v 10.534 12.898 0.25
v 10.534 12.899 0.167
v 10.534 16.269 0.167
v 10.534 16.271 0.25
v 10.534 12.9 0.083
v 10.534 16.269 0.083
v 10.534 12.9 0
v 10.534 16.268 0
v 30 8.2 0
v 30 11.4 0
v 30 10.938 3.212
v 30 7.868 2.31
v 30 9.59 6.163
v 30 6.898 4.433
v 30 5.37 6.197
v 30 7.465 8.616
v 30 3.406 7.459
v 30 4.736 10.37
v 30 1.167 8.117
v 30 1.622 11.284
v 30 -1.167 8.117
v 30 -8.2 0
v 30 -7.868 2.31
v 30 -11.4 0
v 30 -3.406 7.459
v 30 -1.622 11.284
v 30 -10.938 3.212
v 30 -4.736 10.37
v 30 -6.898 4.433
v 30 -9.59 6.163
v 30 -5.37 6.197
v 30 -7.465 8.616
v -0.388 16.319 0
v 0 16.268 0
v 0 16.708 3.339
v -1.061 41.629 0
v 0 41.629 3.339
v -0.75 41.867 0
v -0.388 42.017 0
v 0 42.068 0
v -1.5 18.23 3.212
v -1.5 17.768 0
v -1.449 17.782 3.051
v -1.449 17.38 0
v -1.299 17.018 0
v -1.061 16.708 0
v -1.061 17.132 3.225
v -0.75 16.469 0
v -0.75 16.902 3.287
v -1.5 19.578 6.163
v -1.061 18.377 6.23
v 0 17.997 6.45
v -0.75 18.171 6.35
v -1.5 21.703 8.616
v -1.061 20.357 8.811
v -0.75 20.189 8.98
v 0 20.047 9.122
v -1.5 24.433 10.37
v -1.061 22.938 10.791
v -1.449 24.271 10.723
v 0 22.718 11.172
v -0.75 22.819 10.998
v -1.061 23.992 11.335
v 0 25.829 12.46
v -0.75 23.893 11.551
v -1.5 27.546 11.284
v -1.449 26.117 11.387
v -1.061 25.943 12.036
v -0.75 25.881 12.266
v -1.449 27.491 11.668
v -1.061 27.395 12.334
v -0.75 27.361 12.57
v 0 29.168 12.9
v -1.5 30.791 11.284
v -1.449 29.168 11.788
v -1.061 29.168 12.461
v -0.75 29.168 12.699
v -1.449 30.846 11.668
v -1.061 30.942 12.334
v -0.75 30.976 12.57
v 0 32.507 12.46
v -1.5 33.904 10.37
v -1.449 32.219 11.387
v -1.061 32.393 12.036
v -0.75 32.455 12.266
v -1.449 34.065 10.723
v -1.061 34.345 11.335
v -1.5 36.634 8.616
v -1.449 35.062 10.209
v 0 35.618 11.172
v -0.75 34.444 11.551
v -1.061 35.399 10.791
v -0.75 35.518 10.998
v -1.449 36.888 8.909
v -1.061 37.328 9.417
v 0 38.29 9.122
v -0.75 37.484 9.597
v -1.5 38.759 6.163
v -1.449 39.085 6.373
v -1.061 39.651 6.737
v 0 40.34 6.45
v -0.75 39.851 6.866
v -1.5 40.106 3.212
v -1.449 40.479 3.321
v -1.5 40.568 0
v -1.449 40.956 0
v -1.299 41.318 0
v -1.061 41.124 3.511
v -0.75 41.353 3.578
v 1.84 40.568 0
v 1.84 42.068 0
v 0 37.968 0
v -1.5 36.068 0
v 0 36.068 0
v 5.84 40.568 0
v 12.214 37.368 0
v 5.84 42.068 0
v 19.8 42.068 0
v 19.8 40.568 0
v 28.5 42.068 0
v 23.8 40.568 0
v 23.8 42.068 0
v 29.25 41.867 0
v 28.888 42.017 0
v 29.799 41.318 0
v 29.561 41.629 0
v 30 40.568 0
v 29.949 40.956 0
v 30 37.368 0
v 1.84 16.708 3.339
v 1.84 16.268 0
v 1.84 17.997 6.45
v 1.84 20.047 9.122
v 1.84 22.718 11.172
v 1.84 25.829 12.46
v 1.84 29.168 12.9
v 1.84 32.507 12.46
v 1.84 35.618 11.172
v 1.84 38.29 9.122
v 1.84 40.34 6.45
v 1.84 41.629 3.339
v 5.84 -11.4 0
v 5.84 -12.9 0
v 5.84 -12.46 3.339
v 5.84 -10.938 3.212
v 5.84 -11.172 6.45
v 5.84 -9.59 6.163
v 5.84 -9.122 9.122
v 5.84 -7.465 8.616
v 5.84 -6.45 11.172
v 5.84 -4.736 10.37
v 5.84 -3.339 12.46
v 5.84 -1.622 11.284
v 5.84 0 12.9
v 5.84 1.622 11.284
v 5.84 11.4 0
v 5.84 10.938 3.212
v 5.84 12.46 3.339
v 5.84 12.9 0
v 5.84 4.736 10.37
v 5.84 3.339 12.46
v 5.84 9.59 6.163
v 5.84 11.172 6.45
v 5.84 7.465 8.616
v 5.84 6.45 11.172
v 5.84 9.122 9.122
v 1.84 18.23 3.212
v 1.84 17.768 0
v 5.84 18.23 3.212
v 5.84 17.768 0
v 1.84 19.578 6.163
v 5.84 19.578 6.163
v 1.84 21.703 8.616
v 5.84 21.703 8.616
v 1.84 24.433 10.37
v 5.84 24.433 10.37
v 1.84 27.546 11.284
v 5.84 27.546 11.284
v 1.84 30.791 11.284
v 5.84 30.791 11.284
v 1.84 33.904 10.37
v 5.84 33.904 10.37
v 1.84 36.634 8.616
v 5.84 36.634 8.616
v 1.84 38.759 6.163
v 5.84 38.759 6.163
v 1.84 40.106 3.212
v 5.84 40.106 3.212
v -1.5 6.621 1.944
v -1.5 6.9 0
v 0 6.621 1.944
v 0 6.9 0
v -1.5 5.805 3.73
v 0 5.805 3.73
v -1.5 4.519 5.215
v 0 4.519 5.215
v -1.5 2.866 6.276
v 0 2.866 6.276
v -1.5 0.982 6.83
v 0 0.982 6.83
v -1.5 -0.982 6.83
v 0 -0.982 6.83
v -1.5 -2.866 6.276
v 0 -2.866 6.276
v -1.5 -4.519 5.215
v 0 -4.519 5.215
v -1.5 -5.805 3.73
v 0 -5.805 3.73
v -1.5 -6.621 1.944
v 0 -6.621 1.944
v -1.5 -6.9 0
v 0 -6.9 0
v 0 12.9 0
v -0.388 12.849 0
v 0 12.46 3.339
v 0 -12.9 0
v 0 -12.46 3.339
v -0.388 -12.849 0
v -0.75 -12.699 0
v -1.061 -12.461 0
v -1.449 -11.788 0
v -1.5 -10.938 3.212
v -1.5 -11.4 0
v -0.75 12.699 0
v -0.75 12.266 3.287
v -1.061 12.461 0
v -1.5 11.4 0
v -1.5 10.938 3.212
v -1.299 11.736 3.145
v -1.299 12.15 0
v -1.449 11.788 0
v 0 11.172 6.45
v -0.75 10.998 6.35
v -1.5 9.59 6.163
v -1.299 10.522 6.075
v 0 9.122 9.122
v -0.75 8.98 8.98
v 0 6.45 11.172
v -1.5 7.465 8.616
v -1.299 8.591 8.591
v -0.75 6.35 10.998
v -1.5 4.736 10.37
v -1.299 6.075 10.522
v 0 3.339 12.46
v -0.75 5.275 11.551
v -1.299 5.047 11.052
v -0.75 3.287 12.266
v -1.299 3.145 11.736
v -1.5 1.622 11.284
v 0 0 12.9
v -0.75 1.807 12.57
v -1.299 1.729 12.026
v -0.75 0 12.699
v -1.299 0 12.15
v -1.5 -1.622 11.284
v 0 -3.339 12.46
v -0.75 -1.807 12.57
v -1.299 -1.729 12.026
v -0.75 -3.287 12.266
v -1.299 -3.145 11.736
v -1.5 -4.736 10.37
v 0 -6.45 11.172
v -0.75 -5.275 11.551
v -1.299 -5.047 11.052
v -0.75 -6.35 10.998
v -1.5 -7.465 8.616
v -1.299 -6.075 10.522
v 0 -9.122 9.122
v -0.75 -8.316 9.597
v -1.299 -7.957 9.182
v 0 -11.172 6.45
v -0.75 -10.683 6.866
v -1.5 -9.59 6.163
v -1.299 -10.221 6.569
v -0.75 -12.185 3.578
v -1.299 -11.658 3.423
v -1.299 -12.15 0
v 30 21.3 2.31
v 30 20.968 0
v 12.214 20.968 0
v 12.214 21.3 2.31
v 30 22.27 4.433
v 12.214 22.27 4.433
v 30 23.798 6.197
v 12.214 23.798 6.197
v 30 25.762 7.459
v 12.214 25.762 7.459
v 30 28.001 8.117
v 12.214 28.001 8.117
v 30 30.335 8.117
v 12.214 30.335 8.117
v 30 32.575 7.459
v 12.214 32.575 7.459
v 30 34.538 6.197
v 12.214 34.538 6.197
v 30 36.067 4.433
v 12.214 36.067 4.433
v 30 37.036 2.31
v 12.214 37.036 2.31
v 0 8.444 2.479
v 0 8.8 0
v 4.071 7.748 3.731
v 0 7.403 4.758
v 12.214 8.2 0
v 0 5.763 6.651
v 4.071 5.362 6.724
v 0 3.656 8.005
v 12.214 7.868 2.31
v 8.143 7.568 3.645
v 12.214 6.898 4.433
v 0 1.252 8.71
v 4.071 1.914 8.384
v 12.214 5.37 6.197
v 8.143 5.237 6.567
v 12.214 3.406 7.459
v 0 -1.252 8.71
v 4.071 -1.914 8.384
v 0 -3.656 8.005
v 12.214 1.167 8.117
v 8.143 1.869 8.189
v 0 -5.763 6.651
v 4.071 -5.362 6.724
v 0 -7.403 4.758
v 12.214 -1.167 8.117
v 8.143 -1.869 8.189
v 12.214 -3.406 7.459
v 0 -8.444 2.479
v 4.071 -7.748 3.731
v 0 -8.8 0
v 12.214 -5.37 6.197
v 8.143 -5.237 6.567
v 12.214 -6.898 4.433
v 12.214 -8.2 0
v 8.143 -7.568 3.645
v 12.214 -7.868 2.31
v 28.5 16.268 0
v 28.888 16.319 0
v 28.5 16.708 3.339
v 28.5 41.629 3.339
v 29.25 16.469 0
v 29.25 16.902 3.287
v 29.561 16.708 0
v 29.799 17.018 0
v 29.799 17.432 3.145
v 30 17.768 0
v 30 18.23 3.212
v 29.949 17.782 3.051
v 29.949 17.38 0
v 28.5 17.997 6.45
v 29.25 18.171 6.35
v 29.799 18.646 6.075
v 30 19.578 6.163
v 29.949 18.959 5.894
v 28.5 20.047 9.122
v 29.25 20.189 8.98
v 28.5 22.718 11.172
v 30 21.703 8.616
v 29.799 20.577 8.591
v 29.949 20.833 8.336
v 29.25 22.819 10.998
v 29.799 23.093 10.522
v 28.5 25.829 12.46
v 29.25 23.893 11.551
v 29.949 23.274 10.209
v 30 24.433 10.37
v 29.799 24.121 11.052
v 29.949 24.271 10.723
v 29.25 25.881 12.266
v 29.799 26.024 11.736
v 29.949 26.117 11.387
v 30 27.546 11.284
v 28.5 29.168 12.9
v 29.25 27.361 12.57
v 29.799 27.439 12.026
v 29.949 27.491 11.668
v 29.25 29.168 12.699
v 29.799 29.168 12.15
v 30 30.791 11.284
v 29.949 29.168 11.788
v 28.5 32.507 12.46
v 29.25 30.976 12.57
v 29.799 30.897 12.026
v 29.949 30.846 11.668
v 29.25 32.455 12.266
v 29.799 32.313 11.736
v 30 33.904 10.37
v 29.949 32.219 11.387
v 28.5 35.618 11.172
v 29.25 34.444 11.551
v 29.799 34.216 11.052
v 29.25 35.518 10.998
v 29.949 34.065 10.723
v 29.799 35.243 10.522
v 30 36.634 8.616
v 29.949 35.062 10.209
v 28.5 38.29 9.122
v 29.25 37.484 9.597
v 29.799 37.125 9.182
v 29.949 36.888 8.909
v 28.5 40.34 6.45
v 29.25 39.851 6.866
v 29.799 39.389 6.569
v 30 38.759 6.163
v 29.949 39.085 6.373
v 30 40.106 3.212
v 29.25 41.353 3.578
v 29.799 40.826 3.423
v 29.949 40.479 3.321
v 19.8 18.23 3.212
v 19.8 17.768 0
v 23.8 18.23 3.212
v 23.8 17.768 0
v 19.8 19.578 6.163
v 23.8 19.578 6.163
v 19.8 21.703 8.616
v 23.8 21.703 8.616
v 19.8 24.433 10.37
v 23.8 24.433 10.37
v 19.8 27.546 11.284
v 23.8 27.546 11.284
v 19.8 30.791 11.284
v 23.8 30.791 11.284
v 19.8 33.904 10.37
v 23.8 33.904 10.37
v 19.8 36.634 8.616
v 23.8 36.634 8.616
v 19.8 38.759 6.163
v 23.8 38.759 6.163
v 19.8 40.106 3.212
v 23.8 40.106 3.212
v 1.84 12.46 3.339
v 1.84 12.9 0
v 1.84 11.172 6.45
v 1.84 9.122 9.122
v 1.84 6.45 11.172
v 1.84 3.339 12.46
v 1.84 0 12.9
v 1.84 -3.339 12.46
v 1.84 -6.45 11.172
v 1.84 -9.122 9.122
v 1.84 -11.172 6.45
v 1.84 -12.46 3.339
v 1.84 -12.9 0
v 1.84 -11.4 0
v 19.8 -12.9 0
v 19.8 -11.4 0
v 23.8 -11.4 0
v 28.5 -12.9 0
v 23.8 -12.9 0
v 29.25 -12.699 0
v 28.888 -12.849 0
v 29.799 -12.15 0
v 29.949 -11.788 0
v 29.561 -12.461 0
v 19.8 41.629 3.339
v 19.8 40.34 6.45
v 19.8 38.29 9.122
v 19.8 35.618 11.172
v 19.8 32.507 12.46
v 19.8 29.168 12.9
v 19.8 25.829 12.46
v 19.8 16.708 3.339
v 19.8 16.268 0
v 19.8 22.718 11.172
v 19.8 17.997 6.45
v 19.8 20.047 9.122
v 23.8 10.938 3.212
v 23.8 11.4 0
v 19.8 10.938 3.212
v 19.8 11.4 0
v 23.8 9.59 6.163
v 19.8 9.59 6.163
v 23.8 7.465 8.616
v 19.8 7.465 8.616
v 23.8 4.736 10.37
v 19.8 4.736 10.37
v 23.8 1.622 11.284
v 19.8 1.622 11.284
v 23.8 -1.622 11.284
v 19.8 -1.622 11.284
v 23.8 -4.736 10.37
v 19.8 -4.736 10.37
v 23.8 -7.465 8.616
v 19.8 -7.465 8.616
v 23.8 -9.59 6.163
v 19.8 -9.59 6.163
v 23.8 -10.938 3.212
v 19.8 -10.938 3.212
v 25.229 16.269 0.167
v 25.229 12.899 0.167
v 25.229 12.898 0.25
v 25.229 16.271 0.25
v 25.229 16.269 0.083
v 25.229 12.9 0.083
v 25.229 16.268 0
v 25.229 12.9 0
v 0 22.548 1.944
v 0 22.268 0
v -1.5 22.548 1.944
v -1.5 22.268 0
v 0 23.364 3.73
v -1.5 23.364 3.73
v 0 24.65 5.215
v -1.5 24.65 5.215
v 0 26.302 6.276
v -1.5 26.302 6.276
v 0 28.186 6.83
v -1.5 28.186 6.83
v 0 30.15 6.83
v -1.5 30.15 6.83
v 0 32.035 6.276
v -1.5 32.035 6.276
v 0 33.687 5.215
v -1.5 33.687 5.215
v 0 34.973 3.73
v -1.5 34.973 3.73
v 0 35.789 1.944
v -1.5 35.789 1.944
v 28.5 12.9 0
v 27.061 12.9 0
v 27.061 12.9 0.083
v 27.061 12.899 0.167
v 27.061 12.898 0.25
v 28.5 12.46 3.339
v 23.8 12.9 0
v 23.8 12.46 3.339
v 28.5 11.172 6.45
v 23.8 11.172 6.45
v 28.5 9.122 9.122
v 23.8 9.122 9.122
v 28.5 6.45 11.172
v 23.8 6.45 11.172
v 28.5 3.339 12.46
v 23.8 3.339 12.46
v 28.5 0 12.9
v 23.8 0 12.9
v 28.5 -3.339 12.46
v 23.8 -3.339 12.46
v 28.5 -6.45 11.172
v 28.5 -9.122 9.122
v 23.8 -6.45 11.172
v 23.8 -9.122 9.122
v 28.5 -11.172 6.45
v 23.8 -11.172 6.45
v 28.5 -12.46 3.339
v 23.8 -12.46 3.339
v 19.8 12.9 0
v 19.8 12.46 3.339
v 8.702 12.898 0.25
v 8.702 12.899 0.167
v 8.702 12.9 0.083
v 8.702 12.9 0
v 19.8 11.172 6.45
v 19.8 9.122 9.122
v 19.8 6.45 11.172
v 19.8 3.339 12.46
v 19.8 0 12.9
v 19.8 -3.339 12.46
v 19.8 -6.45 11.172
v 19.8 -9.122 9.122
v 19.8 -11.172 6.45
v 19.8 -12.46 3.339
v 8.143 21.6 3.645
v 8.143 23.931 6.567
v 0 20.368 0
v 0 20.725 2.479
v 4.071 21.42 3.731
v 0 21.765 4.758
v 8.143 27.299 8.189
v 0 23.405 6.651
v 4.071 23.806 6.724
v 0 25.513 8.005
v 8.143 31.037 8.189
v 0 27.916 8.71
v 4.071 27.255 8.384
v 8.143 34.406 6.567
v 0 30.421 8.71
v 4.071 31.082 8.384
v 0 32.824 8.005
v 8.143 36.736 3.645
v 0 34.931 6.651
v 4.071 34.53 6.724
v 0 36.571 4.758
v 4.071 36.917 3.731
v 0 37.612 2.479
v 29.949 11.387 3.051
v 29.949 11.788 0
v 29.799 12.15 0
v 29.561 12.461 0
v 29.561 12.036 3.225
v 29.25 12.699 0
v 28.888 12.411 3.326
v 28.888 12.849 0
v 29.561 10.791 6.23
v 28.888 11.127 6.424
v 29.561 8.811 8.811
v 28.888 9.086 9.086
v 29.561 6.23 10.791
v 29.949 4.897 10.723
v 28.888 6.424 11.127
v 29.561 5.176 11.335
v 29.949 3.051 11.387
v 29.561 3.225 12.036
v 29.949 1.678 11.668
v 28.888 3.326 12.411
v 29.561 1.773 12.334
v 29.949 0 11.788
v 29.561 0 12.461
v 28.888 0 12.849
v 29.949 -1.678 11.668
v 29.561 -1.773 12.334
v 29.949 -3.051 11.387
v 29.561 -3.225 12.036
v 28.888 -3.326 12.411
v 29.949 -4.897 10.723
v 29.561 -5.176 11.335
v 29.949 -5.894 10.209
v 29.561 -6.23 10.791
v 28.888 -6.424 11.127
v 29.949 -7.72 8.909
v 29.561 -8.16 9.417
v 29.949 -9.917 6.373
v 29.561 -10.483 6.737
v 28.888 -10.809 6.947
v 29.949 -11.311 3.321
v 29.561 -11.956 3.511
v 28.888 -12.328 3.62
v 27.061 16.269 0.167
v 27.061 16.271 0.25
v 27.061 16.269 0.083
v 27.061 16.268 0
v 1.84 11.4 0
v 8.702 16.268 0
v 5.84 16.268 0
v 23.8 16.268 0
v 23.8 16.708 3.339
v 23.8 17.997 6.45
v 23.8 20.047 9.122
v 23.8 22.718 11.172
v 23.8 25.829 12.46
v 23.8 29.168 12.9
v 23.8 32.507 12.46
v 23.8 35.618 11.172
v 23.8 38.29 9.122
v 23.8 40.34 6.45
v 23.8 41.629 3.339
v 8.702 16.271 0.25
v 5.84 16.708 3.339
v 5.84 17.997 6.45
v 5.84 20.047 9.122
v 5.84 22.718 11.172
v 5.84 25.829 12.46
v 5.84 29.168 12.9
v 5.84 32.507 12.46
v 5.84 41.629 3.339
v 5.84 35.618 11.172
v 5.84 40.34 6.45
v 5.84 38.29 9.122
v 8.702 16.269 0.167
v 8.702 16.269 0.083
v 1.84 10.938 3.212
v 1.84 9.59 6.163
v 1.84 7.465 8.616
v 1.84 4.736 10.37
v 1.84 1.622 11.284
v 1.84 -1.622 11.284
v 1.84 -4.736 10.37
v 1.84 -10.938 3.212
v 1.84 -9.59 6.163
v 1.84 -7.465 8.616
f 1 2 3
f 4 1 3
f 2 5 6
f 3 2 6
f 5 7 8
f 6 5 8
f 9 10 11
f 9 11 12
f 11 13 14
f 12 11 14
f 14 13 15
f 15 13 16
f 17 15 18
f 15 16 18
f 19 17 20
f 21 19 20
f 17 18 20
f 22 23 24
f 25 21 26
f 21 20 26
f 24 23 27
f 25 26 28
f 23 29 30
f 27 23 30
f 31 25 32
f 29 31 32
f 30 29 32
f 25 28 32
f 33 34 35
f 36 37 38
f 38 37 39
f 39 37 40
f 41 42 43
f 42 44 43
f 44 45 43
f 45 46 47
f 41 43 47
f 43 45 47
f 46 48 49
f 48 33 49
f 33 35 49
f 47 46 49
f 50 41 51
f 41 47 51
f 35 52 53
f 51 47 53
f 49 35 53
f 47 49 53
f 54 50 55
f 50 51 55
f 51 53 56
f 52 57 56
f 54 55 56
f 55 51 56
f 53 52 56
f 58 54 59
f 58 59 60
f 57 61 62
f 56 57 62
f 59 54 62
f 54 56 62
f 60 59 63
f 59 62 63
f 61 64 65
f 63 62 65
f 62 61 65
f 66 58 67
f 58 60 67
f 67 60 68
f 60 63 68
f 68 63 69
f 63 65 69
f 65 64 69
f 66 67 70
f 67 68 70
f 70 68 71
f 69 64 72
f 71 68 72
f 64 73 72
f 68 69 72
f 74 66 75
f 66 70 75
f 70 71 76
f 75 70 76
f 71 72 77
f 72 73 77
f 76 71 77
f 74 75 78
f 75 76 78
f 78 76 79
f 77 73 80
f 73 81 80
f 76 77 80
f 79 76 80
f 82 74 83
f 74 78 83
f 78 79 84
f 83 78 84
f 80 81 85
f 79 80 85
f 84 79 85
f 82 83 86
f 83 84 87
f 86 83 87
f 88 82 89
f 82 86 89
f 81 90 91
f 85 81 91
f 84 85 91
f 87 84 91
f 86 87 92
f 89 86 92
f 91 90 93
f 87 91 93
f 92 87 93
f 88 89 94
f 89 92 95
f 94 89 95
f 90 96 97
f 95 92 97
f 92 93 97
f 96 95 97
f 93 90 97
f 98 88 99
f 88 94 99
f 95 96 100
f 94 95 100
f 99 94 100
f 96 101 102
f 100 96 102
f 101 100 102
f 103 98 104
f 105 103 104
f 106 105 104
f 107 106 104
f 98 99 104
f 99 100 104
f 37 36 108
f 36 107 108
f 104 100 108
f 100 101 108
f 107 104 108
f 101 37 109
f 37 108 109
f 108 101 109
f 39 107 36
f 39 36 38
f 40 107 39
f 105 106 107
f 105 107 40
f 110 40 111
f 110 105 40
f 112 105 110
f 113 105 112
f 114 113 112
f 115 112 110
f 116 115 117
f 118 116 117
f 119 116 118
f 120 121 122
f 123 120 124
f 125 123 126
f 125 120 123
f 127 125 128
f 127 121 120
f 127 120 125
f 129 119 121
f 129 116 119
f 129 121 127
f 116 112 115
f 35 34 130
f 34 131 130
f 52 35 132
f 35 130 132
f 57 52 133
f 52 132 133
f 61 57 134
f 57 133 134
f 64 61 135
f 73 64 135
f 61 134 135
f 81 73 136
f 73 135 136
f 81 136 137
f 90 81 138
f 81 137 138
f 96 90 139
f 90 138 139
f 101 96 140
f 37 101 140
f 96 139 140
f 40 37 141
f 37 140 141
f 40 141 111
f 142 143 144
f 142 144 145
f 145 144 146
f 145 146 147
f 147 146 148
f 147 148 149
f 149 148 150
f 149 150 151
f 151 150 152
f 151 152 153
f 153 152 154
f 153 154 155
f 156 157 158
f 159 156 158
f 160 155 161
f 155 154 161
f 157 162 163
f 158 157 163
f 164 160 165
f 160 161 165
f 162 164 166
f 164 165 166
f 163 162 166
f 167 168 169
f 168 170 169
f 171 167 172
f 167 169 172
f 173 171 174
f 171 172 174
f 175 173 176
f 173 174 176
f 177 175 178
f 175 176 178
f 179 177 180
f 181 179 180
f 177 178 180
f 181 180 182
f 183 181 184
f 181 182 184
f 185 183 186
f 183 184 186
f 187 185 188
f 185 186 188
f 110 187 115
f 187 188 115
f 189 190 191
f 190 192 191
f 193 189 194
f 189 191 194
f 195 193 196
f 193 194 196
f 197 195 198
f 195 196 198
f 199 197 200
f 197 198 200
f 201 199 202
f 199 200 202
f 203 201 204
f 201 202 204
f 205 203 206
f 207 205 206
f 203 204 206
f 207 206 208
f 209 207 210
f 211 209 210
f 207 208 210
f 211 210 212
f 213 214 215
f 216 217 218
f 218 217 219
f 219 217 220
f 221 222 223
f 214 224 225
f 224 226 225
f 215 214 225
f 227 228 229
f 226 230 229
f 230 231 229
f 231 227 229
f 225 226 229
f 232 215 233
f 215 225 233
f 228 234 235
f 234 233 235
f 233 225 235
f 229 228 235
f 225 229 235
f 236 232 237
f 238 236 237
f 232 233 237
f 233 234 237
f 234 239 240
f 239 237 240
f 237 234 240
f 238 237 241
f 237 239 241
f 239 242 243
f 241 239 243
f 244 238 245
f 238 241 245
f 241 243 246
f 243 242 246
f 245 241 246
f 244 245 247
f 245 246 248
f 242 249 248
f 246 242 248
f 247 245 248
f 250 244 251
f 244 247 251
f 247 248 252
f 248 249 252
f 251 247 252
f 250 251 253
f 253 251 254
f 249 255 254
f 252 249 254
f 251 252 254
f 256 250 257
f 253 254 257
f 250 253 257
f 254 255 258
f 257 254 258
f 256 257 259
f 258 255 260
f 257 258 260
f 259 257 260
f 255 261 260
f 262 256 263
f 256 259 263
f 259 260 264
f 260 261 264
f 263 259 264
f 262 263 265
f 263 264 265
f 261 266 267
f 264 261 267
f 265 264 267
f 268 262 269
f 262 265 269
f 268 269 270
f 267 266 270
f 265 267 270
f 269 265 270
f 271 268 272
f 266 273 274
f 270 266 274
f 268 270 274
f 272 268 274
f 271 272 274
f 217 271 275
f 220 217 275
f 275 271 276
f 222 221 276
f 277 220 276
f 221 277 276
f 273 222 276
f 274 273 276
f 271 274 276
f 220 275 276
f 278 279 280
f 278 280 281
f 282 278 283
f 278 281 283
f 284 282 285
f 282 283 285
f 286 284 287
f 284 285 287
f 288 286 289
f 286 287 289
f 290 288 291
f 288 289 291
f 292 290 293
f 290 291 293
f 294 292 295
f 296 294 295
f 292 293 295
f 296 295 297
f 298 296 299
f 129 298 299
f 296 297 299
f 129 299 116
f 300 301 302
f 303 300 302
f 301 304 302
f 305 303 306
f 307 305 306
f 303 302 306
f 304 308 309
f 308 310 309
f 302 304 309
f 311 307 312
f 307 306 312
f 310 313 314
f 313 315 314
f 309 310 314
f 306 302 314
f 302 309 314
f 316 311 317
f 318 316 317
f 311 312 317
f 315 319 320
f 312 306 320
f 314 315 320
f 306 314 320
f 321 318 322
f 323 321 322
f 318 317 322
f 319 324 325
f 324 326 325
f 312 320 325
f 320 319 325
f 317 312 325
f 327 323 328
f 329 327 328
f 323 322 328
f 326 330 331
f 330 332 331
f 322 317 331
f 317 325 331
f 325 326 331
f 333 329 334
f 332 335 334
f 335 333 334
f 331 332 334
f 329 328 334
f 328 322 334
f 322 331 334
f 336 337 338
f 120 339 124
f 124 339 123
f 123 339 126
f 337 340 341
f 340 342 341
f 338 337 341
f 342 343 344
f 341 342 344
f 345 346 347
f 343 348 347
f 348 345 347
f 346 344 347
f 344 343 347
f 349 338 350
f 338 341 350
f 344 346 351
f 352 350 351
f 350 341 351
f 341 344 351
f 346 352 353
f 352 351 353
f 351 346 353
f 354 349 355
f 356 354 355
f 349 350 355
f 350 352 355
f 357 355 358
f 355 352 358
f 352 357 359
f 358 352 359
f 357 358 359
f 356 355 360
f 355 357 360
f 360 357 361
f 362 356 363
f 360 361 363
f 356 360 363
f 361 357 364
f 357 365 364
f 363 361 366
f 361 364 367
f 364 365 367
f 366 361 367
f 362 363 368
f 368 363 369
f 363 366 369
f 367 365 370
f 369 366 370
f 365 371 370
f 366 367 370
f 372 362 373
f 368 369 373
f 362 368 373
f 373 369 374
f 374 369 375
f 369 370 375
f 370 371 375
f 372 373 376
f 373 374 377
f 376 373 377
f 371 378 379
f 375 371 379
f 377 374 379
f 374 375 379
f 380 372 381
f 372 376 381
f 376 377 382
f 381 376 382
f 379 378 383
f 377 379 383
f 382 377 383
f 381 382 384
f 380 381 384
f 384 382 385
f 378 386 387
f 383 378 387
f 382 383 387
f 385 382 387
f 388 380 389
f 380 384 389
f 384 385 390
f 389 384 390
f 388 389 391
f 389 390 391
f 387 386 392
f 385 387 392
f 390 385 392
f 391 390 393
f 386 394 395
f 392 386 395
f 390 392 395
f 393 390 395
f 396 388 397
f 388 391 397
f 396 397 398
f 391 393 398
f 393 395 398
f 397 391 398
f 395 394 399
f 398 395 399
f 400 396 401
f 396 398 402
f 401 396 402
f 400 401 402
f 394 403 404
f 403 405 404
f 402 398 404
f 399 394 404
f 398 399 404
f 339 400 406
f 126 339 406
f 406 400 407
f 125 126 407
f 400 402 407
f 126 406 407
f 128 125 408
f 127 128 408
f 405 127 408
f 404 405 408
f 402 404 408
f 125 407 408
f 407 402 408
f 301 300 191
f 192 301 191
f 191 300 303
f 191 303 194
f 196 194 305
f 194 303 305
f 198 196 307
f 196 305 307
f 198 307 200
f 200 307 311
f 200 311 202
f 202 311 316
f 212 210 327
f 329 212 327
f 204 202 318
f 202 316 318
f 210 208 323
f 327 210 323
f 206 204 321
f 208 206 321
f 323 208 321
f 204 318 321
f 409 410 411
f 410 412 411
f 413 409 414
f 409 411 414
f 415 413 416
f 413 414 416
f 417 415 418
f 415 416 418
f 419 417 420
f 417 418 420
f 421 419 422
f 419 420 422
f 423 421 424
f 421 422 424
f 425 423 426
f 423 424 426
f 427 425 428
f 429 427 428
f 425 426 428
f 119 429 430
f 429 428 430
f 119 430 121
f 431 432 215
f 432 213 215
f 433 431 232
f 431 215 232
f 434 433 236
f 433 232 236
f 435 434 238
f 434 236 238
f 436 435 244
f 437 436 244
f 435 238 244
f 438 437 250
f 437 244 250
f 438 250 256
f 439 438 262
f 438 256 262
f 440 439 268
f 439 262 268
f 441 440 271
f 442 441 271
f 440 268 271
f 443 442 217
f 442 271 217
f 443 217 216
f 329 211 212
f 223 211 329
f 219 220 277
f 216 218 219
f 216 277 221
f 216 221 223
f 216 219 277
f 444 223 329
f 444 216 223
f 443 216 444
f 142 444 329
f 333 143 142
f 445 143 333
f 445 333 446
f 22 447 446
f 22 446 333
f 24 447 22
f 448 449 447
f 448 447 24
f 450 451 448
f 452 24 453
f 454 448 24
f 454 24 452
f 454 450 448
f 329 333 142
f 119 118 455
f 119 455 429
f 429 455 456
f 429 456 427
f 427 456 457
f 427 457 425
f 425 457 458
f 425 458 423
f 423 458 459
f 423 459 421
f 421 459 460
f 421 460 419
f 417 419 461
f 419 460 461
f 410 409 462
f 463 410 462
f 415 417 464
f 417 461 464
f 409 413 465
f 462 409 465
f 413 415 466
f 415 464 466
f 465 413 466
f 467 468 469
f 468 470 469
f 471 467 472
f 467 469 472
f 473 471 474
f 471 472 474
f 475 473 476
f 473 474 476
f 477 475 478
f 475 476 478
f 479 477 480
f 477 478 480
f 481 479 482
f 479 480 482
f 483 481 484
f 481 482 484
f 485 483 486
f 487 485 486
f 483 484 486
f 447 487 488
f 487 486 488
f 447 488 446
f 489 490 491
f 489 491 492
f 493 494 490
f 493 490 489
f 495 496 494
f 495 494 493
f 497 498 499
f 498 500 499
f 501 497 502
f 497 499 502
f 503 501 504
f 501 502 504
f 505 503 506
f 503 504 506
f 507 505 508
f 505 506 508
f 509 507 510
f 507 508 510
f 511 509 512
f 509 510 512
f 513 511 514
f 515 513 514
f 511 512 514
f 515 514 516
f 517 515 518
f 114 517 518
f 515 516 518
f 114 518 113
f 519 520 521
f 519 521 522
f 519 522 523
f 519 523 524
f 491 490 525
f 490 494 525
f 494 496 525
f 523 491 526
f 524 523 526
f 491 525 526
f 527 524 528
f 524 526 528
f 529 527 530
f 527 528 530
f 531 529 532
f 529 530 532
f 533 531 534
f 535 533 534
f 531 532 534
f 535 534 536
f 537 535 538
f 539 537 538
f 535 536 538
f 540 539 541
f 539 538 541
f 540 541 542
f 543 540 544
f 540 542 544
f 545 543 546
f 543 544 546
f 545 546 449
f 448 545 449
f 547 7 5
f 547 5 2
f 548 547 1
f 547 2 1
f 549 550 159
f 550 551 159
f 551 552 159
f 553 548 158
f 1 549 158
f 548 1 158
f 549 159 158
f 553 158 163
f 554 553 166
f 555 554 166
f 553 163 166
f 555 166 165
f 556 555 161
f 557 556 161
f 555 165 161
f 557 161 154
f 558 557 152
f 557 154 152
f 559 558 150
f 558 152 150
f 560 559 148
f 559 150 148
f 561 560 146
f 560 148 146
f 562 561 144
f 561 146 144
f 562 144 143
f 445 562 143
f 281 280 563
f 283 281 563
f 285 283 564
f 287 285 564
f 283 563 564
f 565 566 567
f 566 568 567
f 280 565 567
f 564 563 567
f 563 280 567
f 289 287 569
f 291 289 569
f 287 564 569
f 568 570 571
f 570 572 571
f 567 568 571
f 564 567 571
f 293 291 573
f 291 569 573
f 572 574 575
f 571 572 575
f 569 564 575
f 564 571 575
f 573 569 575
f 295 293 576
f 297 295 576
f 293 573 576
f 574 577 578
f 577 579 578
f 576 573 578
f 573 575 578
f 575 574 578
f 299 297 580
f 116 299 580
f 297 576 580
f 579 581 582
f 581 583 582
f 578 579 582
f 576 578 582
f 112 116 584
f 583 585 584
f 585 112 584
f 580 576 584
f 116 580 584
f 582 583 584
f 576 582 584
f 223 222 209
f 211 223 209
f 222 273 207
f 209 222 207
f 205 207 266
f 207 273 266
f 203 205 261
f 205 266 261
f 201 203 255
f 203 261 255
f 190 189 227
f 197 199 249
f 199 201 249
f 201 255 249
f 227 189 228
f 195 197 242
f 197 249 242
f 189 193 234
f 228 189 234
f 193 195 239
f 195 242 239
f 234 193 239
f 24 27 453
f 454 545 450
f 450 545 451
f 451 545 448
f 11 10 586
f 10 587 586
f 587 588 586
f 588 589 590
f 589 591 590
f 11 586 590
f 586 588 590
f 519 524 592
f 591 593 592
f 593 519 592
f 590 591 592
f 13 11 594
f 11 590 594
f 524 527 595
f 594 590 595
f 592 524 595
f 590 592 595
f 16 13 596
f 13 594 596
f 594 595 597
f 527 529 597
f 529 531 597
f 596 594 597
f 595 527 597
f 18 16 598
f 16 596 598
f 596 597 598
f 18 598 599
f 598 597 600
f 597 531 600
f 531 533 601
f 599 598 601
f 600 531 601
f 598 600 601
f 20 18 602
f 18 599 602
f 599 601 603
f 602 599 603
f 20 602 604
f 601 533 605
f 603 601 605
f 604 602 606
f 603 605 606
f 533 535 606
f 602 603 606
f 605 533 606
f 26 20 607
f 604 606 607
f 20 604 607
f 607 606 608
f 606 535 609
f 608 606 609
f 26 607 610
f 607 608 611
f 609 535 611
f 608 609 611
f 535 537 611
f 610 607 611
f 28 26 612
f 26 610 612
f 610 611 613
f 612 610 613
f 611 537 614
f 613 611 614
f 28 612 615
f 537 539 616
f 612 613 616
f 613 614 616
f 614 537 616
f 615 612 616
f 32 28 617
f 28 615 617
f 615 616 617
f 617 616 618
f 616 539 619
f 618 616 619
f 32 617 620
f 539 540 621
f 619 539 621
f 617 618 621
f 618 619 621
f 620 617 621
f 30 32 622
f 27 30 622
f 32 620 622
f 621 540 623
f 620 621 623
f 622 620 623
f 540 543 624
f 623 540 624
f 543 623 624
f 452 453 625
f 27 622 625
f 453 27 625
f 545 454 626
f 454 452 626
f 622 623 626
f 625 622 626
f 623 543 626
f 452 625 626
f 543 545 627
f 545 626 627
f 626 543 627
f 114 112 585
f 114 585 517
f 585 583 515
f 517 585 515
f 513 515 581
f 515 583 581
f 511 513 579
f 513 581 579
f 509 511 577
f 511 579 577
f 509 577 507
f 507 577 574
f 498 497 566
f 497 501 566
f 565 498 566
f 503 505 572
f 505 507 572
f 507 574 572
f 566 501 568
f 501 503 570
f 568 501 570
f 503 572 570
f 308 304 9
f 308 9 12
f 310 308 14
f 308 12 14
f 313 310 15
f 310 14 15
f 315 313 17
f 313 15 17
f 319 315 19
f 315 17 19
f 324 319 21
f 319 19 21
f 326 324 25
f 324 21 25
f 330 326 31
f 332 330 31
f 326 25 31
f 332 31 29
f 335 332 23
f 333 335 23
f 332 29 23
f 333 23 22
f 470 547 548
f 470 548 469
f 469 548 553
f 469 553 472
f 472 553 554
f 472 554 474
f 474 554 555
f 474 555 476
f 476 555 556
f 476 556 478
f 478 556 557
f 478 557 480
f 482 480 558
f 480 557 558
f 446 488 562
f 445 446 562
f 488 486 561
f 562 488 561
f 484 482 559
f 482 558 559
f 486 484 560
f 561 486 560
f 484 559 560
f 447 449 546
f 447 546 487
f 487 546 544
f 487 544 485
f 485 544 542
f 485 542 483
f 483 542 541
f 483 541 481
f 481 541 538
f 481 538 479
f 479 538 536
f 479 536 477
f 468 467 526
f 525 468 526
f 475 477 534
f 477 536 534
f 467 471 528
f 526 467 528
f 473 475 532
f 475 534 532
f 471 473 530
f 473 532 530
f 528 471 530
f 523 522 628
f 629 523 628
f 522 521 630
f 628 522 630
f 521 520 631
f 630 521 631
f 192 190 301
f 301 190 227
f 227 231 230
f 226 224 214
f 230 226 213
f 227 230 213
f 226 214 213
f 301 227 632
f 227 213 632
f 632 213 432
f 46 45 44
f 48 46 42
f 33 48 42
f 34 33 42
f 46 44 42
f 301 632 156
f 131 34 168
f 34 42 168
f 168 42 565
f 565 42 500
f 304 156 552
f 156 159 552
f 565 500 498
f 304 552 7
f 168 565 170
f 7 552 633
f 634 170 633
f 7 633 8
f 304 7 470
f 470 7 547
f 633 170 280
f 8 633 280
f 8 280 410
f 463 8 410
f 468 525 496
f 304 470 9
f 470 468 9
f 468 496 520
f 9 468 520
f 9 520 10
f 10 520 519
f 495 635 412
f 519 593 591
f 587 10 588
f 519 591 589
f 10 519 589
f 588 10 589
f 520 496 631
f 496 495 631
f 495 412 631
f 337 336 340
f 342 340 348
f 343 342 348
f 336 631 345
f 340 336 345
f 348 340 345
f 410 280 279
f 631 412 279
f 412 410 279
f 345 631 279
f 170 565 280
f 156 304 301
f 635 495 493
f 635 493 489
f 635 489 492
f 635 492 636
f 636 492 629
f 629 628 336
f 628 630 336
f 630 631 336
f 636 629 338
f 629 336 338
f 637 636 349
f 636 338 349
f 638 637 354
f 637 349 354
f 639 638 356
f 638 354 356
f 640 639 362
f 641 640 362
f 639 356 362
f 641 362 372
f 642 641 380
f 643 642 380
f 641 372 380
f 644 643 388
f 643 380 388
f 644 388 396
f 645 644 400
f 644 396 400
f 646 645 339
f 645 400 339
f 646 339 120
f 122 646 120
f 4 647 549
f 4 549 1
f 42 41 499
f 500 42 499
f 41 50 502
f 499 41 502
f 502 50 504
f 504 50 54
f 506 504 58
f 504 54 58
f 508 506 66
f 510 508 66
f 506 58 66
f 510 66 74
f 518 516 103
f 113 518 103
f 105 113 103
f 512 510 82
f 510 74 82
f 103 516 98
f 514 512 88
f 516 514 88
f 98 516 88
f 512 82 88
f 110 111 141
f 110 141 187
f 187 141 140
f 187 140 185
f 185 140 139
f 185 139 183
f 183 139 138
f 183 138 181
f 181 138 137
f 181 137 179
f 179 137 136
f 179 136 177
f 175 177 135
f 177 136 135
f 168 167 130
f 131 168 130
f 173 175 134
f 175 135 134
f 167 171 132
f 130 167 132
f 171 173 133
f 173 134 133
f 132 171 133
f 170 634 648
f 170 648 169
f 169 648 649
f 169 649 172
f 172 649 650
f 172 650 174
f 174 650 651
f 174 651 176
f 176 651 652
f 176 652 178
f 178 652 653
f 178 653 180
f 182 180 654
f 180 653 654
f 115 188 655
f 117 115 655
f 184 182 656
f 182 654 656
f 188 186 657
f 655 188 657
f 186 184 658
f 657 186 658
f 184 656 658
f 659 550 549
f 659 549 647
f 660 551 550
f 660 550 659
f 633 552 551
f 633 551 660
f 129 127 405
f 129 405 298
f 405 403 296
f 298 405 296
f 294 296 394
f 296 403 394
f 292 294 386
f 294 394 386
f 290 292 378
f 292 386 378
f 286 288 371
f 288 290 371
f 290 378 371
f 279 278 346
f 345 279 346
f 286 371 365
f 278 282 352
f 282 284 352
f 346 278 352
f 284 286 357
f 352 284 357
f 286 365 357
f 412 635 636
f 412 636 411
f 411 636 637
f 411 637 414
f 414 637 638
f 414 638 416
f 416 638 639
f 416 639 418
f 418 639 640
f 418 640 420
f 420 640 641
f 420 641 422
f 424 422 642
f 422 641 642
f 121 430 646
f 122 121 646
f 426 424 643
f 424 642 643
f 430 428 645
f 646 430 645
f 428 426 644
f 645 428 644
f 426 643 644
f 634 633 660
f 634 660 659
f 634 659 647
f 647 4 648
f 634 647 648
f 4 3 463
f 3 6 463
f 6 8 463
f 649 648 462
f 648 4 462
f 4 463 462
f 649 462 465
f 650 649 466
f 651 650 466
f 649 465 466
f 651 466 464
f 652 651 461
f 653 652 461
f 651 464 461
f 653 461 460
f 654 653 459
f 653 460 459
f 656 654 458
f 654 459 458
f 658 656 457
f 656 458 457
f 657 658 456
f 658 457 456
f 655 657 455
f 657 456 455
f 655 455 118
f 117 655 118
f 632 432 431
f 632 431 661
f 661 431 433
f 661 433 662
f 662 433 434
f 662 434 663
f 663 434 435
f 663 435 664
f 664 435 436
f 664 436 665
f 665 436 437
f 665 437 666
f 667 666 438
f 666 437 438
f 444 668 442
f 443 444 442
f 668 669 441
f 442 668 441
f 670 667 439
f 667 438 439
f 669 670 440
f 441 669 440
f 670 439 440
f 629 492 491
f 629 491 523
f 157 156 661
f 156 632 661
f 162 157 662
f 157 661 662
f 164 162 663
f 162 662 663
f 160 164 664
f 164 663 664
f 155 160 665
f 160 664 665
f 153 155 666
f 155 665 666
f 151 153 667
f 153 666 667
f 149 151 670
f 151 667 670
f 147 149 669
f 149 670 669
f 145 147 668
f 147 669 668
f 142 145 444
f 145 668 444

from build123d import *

# Parameters (mm, degrees)
F2_ANGLE = 180
F3_ANGLE = -180
F1_W     = 1.832515
F1_H     = 4.050821
F1_W_2   = 1.832514
F4_DEPTH = 0.25


with BuildPart() as f2:
    # F0 (on Top) → F2 (revolve)
    with BuildSketch(Plane.XY):
        with BuildLine():
            ThreePointArc((30, 11.4), (29.56066, 12.46066), (28.5, 12.9))
            Line((28.5, 12.9), (23.800393, 12.9))
            Line((23.800393, 12.9), (23.800393, 11.4))
            Line((23.800393, 11.4), (19.800393, 11.4))
            Line((19.800393, 11.4), (19.800393, 12.9))
            Line((19.800393, 12.9), (5.840044, 12.9))
            Line((5.840044, 12.9), (5.840044, 11.4))
            Line((5.840044, 11.4), (1.840044, 11.4))
            Line((1.840044, 11.4), (1.840044, 12.9))
            Line((1.840044, 12.9), (0, 12.9))
            ThreePointArc((0, 12.9), (-1.06066, 12.46066), (-1.5, 11.4))
            Line((-1.5, 11.4), (-1.5, 6.9))
            Line((-1.5, 6.9), (0, 6.9))
            Line((0, 6.9), (0, 8.8))
            Line((0, 8.8), (12.214104, 8.2))
            Line((12.214104, 8.2), (30, 8.2))
            Line((30, 8.2), (30, 11.4))
        make_face()
    revolve(axis=Axis((15, 0, 0), (1, 0, 0)), revolution_arc=F2_ANGLE)



with BuildPart() as f3:
    # F0 (on Top) → F3 (revolve)
    with BuildSketch(Plane.XY):
        with BuildLine():
            Line((19.800393, 17.768246), (23.800393, 17.768246))
            Line((23.800393, 17.768246), (23.800393, 16.268246))
            Line((23.800393, 16.268246), (28.5, 16.268246))
            ThreePointArc((28.5, 16.268246), (29.56066, 16.707586), (30, 17.768246))
            Line((30, 17.768246), (30, 20.968246))
            Line((30, 20.968246), (12.214104, 20.968246))
            Line((12.214104, 20.968246), (0, 20.368246))
            Line((0, 20.368246), (0, 22.268246))
            Line((0, 22.268246), (-1.5, 22.268246))
            Line((-1.5, 22.268246), (-1.5, 17.768246))
            ThreePointArc((-1.5, 17.768246), (-1.06066, 16.707586), (0, 16.268246))
            Line((0, 16.268246), (1.840044, 16.268246))
            Line((1.840044, 16.268246), (1.840044, 17.768246))
            Line((1.840044, 17.768246), (5.840044, 17.768246))
            Line((5.840044, 17.768246), (5.840044, 16.268246))
            Line((5.840044, 16.268246), (19.800393, 16.268246))
            Line((19.800393, 16.268246), (19.800393, 17.768246))
        make_face()
    revolve(axis=Axis((15, 29.168246, 0), (1, 0, 0)), revolution_arc=F3_ANGLE)


with BuildPart() as f2_1:
    add(f2.part)

    add(f3.part)  # F4 merges F3
    # F1 (on Top) → F4 (join)
    with BuildSketch(Plane.XY):
        with Locations((26.144934, 14.680172)):
            Rectangle(F1_W, F1_H)
        with Locations((9.618169, 14.680172)):
            Rectangle(F1_W_2, F1_H)
    extrude(amount=F4_DEPTH)


solid = f2_1.part
